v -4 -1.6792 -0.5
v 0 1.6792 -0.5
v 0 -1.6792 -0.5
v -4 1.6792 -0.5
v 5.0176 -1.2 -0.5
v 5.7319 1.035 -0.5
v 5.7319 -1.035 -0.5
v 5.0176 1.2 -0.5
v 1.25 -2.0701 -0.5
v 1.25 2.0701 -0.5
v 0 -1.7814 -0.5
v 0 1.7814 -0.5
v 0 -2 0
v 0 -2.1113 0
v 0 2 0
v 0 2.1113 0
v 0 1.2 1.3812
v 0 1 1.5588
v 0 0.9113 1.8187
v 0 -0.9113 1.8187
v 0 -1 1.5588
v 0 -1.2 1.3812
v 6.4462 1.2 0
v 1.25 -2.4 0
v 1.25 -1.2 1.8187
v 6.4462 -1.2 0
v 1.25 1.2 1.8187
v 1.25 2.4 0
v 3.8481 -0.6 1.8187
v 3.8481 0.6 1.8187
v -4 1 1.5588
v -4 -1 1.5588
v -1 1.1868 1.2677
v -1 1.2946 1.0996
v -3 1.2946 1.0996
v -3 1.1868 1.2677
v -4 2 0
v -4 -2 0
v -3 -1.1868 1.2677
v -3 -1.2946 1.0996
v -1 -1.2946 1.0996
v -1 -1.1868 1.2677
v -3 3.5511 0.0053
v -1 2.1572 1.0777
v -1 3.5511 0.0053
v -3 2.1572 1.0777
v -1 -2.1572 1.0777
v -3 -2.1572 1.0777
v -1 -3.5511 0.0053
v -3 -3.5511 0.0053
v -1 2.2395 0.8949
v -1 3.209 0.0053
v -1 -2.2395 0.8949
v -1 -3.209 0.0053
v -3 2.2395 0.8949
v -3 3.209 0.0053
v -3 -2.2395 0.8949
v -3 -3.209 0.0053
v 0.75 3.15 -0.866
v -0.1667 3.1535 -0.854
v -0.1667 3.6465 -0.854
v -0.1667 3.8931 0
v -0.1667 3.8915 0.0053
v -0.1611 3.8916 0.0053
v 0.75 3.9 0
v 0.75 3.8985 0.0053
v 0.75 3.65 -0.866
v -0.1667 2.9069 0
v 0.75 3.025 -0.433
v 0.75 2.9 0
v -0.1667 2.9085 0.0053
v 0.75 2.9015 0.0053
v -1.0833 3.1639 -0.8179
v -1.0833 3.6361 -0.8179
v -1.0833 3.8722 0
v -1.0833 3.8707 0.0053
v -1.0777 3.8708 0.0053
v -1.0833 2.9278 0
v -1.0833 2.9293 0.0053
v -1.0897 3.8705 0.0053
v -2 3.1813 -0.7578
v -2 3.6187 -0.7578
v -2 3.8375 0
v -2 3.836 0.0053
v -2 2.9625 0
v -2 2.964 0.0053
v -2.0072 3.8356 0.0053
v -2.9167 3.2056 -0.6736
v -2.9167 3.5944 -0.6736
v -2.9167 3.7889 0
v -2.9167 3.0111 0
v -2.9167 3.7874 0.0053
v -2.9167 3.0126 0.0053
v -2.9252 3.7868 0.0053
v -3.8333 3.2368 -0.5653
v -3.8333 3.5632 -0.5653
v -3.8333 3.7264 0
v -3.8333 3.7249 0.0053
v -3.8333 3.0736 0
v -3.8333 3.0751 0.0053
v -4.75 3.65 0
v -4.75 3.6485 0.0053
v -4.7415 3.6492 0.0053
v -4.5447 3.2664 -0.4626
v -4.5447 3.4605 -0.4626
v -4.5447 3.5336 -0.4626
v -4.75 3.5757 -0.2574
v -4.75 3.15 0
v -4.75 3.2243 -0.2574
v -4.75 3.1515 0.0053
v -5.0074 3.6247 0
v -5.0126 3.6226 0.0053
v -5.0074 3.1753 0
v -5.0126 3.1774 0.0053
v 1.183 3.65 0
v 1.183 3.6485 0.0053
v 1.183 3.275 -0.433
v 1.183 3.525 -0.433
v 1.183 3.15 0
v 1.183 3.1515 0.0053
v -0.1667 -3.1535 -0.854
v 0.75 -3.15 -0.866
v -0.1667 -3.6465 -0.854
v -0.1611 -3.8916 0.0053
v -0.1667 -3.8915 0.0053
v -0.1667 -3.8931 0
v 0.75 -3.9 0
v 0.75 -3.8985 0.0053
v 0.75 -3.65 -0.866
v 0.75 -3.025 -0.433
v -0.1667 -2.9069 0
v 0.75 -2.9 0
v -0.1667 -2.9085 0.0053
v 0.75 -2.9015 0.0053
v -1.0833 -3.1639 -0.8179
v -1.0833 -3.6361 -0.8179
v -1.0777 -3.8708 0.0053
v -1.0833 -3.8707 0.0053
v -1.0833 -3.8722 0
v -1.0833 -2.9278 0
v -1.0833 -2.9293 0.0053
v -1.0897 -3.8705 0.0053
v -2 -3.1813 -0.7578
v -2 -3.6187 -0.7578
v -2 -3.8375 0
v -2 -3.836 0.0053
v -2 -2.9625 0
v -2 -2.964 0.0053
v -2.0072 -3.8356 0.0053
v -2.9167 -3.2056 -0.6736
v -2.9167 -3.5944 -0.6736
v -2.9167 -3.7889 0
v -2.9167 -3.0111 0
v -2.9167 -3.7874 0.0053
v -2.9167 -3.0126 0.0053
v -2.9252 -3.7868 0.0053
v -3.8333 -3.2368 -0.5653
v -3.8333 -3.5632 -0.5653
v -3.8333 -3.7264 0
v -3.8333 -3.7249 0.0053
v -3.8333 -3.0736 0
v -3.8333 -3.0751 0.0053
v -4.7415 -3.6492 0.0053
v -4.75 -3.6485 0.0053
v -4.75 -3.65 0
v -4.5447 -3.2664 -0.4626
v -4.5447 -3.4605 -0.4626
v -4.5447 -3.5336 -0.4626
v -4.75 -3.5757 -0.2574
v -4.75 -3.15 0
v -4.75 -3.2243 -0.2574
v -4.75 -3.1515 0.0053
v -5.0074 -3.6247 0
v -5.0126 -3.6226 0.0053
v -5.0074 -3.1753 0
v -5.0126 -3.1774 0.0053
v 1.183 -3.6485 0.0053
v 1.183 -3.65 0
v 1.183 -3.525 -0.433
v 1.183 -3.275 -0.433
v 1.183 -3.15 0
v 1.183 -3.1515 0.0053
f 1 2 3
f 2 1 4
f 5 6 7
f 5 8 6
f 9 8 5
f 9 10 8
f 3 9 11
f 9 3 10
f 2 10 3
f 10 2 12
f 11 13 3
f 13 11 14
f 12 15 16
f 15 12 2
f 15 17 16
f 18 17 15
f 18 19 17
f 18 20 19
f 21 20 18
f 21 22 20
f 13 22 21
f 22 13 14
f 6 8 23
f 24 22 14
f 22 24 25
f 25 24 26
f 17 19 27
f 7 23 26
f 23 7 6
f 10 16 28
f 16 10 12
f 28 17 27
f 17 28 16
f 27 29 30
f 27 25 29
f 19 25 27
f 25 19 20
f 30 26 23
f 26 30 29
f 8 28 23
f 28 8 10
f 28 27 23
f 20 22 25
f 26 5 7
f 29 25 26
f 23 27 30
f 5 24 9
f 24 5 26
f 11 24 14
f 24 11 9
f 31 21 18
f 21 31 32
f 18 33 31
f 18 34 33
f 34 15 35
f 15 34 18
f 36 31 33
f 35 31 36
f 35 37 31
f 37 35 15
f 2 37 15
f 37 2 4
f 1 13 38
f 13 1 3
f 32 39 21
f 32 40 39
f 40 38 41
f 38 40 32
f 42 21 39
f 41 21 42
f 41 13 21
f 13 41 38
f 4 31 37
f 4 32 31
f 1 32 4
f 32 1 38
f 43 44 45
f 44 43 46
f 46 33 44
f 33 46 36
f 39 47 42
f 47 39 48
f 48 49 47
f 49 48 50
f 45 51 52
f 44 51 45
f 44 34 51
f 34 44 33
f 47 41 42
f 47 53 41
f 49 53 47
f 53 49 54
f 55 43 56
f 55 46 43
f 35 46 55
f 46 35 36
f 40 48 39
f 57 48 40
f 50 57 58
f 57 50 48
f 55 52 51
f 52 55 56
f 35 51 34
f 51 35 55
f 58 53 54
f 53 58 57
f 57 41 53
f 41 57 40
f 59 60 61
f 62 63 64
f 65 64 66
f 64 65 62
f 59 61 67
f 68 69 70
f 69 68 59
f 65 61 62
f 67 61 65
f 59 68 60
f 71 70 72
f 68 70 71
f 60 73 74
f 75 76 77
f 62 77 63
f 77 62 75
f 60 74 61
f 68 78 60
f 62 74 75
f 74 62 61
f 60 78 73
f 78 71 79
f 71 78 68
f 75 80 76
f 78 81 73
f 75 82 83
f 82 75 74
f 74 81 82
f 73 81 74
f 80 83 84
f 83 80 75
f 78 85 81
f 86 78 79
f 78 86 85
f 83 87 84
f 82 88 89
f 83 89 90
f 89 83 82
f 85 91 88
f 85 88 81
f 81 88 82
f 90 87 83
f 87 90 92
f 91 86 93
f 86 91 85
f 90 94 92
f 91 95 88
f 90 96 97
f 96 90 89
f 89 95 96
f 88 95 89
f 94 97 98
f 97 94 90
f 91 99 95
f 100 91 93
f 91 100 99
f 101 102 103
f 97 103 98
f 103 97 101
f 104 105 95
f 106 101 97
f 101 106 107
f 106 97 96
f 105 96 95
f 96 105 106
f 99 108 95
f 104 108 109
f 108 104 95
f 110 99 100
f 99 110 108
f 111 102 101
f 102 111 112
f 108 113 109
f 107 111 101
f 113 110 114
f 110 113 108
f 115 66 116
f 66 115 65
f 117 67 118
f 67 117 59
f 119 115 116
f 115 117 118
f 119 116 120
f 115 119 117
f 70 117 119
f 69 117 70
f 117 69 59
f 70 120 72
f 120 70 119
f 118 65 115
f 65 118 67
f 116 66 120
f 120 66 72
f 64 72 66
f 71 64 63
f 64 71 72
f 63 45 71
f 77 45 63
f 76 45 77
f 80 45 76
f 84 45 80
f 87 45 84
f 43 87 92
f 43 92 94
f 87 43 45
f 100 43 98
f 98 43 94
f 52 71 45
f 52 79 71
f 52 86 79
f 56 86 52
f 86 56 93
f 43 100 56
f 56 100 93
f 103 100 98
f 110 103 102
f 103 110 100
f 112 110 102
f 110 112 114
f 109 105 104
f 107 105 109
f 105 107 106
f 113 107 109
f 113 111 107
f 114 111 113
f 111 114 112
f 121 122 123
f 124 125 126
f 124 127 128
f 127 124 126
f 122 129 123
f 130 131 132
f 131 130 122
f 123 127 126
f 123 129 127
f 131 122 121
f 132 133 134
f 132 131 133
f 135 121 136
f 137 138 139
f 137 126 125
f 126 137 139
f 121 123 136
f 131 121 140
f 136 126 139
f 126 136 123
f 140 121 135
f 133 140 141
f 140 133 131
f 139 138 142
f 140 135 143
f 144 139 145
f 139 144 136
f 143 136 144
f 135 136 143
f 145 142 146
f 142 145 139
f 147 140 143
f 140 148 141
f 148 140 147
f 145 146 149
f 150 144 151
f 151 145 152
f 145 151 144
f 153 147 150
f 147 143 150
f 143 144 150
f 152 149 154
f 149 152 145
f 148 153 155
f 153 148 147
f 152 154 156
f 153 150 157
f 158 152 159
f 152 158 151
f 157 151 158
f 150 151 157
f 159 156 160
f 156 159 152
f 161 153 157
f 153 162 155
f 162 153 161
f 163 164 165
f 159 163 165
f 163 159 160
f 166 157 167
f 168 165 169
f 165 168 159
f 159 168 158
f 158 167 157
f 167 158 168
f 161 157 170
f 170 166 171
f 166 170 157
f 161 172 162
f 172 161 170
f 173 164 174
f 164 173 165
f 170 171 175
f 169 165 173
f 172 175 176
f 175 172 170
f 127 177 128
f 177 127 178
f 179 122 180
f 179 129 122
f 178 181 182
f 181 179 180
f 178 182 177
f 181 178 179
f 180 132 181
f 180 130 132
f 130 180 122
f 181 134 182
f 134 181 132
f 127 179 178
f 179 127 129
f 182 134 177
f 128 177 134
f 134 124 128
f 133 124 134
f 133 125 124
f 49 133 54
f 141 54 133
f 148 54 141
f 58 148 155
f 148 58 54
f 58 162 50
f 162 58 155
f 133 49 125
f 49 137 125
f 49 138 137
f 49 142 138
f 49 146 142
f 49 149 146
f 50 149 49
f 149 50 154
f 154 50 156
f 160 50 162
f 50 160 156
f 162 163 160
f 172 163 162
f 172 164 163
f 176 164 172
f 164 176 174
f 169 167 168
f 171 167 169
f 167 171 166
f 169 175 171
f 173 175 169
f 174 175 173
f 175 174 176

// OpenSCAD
// file: util.scad
fn1 = 32;
fn2 = 16;

module util_half_sphere(radius, fn=fn1) {
    difference() {
        sphere(radius, $fn=fn);
        translate([0,0,-(radius+radius/19)])
            cube(2*radius+radius/10, center=true);
    }
}

function gcd(a,b) = a == b ? a : a > b ? gcd(a-b, b) : gcd(a, b-a);

module util_saucer(length, width, height, fn=fn1) {
    rad = gcd(length,gcd(width,height));
    //rad = 10;
    scale([length/(2*rad), width/(2*rad), height/rad])
        util_half_sphere(rad, fn);
}

module util_half_cylinder(length, radius, inner_fn=fn2, outer_fn=fn1) {
    maxval = max(length, 2*radius);
    intersection() {
        difference() {
            rotate([0,90,0])
                translate([0,0,-(length/2 + length/20)])
                    cylinder(length+length/10, radius, radius, $fn=inner_fn);
            
            translate([0,0,(maxval/2 + maxval/19)])
                cube(maxval+maxval/10, center=true);
        }
        
        translate([0,0,-(radius+radius/20)])
            cylinder(radius + radius/10, length/2, length/2, $fn=outer_fn);
    }
}

module util_body(length, width, height, upper_height, fn=fn1) {
    rad = gcd(length, gcd(width, upper_height));
    
    scale(.995) scale([length/(2*rad), width/(2*rad), 1])
        util_half_cylinder(2*rad, height, outer_fn=fn);
}

module util_graded_cylinder(height, radius_start, radius_end, grades=1, fn=fn1) {
    height_grade = height / grades;
    radius_grade = (radius_start - radius_end) / (grades * grades);
    for (i = [0 : 1 : grades]) {
        translate([0,0,i*height_grade])
            cylinder(height_grade, 
                     radius_start - i*radius_grade * i,
                     radius_start - (i+1) * radius_grade * (i+1),
                     $fn = fn);
    }
}

module util_nacelle(length, width, height, curved=false, up=true, front_bulge=false) {
    rad = min(width, height/2);
    grads = curved ? 6 : 1;
    scale_factor = front_bulge ? 1.1 : 1;
    direction = up ? -1 : 1;
    difference() {
        scale([1, width/ (2*rad), height/rad])
            difference() {
                union() {
                    rotate([0,-90,0])
                        rotate(30)
                            util_graded_cylinder(length-rad, rad, rad/2, grads, 6);
                    scale(scale_factor) 
                        rotate([0,90,0]) rotate(90) sphere(rad, $fn=6);
                }
                
                translate([-length/2, 0, direction * (height/2 + height/19)])
                    cube([length+length, width+width, height+height/10], center=true);
            }
        
        translate([-length-(curved?length/3:0), 0, -length/3])
            rotate([0,-45,0])
                cube(length, center=true);
    }
}

module util_mirrored(v) {
    children();
    mirror(v) children();
}

module util_ring(outer, inner, height) {
    difference() {
        translate([0,0,-height/2])
            cylinder(height, outer, outer);
        translate([0,0,-(height/2 + height/19)])
            cylinder(height+height/10, inner, inner);
    }
}

module util_star(radius, thick, num, half=false) {
    angle = 360/num;
    offset = half? angle/2 : 0;
    for (i = [0: 1: num]) {
        rotate(i* angle + offset)
            translate([radius/2,0,0])
                cube([radius, thick, thick], center=true);
    }
}

module util_ring_star(radius, thick, num, inner, half=false) {
    outer=inner+thick;
    avg = (inner + outer)/2;
    union() {
        difference() {
            util_star(radius, thick, num, half);
            cylinder(2*thick, outer, outer, $fn=num, center=true);
        }
        util_ring(outer, inner, thick);
    }
}

module util_hangar_disk(height, lower, upper, num, fn=fn1) {
    difference() {
            cylinder(height, lower, upper, $fn=fn, center=true);
        difference() {
            scale([1,1,22])
                util_star(1.1*upper, height/20, num, half=true);
            scale(.95)
                cylinder(height, lower, upper, $fn=fn, center=true);
        }
    }
}

module util_hangar_form(length, width, height, num, inner=0) {
    l = 0.6* max(length, width);
    h = 2.5* height;
    thick = h/20;
    inner = inner == 0 ? l/3 : inner;
    difference() {
        children();
        scale([1,1,h/thick]) 
            util_ring_star(l, thick, num, inner, half=true);
    }
    scale(.95) children();
}

module util_nacelle_bar(span, height, width, thickness) {
    rad = (span*span/(8*height) + height/2);
    outer = rad + thickness/2;
    inner = rad - thickness/2;
    difference(){
        translate([0,0,outer])
            rotate([0,90,0])
                util_ring(outer, inner, width);
    
        translate([0,0,1.1*outer+height])
            cube(2.2*outer, center=true);
    }
}
// file: macs.scad
use <util.scad>;



module macs_pod_diff() {
    translate([0,0,-(6+.5)])
        cube(12, center=true);

    translate([-(3+1.25),0,0])
        cube(6, center=true);
}

module macs_pod() {
    difference() {
        scale([1,.4,.35])
            rotate(90)
                sphere(6, $fn=6);
        macs_pod_diff();
    }
    
    //macs_pod_wing();
}



module macs_pod_wing() {
    translate([-1,0,0])
        rotate([0,90,0])
            scale([.1,1,1])
                cylinder(2, 3.5, 2.75, $fn=6);
}

module macs_small_warp() {
    difference() {
        scale([1,1,.9])
            rotate([0,-90,0])
                rotate(90)
                    cylinder(4,2,2,$fn=6, center=true);

        translate([0,0,-(6+.5)])
            cube(12, center=true);
    }

    translate([0,0,1.5])
        mirror([0,0,1])
            scale([1,1.2,0.8])
                util_nacelle_bar(6,2,2,.15);

    util_mirrored([0,1,0])
        translate([2.75,3.4,0])
            util_nacelle(6,1,1,curved=true, up=false);
}

module macs_small_shuttle() {
    union() {
        translate([1.25,0,0]) macs_pod();
        translate([-2,0,0]) macs_small_warp();
    }
}

macs_small_shuttle();
// main file
use <macs.scad>;

module macs_small_shuttle() {
    union() {
        translate([1.25,0,0]) macs_pod();
        translate([-2,0,0]) macs_small_warp();
    }
}

macs_small_shuttle();
